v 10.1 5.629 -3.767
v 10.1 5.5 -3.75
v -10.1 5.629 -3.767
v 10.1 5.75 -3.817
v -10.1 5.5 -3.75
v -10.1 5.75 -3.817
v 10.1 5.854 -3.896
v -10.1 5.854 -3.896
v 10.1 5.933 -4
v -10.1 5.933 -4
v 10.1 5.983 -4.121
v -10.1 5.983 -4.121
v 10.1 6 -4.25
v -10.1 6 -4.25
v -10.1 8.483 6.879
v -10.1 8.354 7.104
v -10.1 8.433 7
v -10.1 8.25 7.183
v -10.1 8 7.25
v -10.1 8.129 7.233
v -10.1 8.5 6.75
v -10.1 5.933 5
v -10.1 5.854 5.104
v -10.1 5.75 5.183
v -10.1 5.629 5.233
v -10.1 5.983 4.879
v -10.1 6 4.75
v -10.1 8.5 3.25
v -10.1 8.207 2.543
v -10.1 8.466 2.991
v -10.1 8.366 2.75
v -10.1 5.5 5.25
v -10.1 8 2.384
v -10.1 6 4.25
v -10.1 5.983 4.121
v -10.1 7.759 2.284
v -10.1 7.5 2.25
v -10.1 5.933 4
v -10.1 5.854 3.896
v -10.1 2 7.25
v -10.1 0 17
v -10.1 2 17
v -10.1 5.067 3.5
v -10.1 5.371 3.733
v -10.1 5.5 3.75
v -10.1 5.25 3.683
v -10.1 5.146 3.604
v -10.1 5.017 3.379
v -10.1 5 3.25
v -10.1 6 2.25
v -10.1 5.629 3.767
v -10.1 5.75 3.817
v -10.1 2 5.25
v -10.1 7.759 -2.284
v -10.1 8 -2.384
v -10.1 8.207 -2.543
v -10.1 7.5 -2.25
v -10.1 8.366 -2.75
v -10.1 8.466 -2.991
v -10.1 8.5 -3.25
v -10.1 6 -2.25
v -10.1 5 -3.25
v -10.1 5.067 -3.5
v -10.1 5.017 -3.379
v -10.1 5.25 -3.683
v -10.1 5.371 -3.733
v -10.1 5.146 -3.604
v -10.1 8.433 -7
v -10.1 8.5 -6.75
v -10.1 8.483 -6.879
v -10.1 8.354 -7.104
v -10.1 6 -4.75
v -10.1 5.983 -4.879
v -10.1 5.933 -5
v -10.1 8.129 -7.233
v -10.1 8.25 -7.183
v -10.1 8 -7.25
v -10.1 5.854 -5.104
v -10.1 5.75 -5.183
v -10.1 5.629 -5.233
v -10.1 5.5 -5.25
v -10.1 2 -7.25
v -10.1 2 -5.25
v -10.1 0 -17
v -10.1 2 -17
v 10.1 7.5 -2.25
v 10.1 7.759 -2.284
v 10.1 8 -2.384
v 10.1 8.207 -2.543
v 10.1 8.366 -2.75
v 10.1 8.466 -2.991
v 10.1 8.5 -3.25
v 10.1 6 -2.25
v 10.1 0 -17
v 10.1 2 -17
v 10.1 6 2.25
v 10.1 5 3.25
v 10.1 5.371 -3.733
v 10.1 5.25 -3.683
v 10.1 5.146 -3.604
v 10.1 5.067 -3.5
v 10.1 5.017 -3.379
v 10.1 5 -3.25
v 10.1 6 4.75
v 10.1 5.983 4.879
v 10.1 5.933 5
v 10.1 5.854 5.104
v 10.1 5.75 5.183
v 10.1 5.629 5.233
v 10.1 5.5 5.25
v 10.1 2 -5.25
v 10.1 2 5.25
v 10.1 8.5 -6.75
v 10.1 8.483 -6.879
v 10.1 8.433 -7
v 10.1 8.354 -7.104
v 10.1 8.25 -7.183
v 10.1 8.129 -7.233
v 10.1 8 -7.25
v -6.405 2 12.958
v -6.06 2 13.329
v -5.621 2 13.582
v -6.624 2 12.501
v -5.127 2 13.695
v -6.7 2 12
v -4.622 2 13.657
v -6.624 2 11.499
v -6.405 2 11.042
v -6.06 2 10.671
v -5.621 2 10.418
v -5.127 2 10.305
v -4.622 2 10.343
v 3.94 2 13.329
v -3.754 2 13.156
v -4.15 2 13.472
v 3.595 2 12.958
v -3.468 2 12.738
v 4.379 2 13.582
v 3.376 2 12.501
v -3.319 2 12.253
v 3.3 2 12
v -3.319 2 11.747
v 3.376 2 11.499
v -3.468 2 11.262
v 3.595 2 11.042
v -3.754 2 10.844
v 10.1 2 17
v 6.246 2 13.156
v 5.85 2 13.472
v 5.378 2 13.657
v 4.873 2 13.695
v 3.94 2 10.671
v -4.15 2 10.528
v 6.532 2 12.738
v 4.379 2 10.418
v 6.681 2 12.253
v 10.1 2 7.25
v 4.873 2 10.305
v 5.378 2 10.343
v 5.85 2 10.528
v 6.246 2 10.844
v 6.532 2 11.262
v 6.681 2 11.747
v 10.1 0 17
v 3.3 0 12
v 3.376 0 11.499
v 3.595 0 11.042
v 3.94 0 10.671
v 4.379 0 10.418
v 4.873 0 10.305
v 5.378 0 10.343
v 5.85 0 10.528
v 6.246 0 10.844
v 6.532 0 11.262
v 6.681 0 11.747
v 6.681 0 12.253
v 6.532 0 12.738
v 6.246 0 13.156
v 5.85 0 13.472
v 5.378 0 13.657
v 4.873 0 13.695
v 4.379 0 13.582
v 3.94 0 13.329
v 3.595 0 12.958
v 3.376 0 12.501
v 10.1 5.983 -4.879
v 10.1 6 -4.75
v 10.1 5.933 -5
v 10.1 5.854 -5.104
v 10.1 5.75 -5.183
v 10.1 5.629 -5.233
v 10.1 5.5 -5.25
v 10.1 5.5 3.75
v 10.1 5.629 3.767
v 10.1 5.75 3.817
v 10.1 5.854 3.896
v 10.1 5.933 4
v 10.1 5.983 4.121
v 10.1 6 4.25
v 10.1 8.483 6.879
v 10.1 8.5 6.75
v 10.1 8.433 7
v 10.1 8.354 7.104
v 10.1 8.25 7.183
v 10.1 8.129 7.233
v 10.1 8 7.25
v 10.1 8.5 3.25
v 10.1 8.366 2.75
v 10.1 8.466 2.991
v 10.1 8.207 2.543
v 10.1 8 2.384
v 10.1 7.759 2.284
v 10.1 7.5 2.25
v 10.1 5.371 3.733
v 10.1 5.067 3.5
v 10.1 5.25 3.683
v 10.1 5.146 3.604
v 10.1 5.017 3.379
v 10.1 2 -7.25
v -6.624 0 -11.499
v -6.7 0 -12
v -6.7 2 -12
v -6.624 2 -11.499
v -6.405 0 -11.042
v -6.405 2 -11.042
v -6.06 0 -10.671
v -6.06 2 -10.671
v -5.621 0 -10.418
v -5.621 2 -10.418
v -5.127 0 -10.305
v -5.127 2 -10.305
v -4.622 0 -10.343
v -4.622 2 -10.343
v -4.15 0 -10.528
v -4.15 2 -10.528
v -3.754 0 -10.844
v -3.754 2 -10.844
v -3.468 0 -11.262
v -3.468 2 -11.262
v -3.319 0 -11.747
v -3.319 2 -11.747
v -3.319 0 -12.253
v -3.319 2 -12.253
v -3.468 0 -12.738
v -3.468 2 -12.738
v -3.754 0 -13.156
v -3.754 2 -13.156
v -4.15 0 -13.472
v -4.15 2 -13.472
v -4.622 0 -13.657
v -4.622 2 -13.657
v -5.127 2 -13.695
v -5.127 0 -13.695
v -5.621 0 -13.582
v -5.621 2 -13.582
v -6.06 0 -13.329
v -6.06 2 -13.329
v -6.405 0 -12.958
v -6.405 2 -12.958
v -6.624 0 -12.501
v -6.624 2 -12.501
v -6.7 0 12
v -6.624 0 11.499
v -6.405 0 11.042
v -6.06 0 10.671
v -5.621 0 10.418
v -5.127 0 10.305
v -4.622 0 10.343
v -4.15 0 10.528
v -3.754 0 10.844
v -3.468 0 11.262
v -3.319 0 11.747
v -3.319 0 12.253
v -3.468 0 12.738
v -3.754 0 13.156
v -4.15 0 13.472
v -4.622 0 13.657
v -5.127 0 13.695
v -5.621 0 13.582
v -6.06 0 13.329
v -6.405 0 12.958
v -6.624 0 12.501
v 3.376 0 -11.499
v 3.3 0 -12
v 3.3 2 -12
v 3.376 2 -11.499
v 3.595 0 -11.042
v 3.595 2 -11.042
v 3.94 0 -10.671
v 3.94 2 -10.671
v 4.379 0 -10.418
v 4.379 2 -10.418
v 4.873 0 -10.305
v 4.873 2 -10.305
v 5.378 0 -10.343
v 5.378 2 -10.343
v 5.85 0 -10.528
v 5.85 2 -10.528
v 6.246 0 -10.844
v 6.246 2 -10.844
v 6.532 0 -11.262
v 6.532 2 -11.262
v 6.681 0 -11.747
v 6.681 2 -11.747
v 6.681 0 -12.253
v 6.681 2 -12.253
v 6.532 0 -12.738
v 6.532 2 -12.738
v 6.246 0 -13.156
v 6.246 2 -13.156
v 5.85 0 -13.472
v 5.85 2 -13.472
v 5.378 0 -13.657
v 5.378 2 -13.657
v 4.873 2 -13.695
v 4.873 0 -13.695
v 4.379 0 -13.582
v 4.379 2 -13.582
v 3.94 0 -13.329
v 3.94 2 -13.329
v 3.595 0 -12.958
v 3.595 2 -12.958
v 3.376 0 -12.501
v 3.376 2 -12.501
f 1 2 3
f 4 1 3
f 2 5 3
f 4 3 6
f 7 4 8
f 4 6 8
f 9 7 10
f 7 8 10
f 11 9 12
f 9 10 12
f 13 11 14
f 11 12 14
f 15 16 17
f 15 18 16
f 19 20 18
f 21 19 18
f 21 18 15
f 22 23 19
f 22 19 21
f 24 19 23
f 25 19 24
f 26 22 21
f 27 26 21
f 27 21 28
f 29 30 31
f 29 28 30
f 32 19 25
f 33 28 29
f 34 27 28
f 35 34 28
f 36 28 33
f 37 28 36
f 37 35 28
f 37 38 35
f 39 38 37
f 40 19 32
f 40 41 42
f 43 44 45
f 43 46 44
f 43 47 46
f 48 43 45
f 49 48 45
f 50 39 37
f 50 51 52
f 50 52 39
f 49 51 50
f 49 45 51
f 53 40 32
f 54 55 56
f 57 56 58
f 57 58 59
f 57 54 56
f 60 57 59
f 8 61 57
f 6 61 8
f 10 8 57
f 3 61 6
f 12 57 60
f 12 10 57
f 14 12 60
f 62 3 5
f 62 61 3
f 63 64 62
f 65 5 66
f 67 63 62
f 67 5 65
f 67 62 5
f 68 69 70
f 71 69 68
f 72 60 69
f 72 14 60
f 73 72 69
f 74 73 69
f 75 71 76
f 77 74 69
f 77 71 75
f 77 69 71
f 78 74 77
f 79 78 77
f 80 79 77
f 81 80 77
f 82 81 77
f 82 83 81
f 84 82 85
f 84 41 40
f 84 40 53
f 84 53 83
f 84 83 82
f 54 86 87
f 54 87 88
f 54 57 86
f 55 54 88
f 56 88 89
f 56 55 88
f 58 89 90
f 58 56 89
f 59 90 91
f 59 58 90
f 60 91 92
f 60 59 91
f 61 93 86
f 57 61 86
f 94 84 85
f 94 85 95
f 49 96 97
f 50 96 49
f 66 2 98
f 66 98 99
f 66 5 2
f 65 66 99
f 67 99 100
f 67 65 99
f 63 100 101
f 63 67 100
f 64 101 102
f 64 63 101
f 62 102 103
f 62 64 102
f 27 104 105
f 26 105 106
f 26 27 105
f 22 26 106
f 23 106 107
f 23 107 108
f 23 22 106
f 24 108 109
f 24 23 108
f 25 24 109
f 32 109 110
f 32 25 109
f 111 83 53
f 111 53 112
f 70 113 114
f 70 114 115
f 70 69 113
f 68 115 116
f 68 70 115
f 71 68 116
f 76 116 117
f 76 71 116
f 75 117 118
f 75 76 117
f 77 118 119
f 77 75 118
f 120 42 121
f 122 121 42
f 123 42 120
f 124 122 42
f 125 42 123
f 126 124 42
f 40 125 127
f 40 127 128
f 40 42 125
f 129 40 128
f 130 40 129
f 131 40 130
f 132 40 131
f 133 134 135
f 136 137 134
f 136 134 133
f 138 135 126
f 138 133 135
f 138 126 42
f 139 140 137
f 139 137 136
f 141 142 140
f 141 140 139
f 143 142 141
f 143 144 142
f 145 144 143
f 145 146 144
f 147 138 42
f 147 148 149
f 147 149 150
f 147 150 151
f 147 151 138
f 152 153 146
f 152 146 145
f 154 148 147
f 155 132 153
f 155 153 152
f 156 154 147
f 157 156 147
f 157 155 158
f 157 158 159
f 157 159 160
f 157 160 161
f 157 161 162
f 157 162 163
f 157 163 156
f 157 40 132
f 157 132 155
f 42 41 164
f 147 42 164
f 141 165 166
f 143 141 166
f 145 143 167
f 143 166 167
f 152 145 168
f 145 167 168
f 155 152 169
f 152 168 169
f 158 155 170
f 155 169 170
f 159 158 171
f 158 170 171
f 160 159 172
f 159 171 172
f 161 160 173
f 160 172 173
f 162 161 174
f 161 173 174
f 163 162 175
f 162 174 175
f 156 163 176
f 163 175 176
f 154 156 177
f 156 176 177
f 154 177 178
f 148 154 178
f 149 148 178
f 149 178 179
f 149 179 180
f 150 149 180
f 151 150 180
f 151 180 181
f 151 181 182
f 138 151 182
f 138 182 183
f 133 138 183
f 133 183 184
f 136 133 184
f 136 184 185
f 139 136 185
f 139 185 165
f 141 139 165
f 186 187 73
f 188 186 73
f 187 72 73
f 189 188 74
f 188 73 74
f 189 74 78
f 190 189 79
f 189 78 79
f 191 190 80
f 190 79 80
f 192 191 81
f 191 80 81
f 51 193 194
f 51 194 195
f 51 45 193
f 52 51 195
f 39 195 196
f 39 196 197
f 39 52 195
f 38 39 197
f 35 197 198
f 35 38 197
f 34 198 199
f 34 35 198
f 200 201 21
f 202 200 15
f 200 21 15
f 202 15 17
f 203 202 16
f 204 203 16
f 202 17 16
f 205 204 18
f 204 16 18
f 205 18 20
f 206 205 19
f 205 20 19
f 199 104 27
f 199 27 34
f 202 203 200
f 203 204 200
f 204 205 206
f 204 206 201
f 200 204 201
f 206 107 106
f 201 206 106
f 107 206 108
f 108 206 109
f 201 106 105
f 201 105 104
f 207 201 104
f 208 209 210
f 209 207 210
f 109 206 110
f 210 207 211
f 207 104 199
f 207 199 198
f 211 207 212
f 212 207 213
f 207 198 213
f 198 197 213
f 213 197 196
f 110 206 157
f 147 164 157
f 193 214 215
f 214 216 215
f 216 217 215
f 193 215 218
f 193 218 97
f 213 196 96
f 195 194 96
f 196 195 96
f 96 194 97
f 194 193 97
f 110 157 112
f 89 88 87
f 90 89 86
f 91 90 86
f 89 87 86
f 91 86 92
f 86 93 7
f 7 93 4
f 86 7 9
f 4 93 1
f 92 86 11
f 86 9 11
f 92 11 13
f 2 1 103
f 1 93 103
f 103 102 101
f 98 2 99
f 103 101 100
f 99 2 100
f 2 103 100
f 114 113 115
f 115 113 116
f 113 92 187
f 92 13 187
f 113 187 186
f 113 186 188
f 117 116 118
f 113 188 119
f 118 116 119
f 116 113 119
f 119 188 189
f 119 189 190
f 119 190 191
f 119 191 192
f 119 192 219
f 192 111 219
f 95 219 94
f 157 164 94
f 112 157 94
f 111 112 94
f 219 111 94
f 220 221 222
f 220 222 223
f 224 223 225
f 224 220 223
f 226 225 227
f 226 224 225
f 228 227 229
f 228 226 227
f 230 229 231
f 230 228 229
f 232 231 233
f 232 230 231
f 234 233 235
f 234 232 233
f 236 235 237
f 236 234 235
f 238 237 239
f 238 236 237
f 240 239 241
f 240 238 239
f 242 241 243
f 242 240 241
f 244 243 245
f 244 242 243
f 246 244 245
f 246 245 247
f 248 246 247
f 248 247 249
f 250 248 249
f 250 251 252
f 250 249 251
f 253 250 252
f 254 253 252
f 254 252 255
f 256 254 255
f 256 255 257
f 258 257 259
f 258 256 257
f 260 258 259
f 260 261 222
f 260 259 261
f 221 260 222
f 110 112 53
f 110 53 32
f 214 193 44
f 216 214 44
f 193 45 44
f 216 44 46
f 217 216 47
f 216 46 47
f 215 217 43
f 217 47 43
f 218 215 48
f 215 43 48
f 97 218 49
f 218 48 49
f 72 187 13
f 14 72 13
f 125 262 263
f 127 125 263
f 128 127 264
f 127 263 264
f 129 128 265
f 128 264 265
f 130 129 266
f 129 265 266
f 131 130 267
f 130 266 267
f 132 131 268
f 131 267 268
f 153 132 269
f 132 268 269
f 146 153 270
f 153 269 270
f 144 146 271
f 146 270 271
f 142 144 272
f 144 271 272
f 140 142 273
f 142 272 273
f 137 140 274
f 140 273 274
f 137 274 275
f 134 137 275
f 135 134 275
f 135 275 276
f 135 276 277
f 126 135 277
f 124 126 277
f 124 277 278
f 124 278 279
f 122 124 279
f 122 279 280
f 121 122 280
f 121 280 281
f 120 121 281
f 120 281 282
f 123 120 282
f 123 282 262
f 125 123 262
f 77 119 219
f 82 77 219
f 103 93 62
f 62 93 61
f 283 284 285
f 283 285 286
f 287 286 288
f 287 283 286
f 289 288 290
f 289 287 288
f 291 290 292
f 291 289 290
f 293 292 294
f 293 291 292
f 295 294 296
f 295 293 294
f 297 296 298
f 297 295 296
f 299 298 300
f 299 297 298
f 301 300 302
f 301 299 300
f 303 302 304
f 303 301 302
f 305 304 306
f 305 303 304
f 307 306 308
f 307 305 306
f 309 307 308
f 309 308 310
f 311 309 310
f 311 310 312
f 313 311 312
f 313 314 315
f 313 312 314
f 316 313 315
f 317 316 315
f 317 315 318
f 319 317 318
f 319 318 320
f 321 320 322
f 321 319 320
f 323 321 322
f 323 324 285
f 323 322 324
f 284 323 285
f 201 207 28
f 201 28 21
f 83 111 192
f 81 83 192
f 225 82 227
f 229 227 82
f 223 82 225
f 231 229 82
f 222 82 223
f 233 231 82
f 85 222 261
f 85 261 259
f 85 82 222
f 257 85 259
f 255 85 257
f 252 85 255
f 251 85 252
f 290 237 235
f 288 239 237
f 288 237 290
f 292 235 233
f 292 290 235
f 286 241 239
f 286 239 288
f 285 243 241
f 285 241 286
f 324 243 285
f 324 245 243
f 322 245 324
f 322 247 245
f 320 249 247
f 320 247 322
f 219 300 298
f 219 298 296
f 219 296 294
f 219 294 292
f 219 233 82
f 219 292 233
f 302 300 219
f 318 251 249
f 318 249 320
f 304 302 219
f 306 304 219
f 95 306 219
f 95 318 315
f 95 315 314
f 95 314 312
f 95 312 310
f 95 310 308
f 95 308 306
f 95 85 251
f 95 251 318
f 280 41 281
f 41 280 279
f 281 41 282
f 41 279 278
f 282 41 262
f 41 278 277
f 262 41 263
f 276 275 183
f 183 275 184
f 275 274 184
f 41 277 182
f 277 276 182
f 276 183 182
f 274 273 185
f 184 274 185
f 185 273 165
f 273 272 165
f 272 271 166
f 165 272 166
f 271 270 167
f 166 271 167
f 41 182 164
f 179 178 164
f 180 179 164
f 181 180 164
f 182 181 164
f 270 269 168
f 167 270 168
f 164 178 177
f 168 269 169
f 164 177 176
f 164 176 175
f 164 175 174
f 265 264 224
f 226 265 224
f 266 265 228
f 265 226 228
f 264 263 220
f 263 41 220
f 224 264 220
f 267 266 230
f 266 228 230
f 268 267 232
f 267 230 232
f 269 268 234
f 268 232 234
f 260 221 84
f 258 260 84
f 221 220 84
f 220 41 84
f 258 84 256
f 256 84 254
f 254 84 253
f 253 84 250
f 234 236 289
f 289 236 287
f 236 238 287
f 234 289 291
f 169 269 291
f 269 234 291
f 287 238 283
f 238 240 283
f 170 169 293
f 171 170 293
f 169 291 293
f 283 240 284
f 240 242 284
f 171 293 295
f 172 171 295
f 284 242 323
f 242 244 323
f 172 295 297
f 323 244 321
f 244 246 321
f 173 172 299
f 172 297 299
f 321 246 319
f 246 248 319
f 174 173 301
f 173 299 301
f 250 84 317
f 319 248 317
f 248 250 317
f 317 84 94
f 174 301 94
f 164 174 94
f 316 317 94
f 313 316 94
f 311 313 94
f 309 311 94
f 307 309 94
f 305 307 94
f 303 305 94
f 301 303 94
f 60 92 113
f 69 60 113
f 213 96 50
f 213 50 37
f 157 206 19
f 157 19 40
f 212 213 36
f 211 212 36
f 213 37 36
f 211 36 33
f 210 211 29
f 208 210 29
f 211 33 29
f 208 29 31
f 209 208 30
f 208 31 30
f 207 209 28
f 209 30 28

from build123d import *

# Parameters (mm, degrees)
SCHIZZO1_W                   = 20.2
SCHIZZO1_H                   = 34
ESTRUSIONE_ESTRUSIONE1_DEPTH = 2
ESTRUSIONE_ESTRUSIONE2_DEPTH = 20.2
SMUSSO1_SIZE                 = 1
RACCORDO2_R                  = 0.5
RACCORDO3_R                  = 1
FORO_PER_VITE_M3_1_D         = 3.4
SMUSSO1_OF_SPECCHIA2_SIZE    = 1
RACCORDO2_OF_SPECCHIA2_R     = 0.5
RACCORDO3_OF_SPECCHIA2_R     = 1


with BuildPart() as part:
    # Schizzo1 → Estrusione-Estrusione1 (new body)
    with BuildSketch(Plane(origin=(0, 0, 0), x_dir=(1, 0, 0), z_dir=(0, 1, 0))):
        Rectangle(SCHIZZO1_W, SCHIZZO1_H)
    extrude(amount=ESTRUSIONE_ESTRUSIONE1_DEPTH)

    # Schizzo3 → Estrusione-Estrusione2 (add)
    with BuildSketch(Plane(origin=(10.1, 0, 0), x_dir=(0, 0, -1), z_dir=(1, 0, 0))):
        Polygon((-7.25, 2), (-5.25, 2), (-5.25, 6), (-3.75, 6), (-3.75, 5), (-2.25, 5), (-2.25, 8.5), (-7.25, 8.5), align=None)
    estrusione_estrusione2 = extrude(amount=-ESTRUSIONE_ESTRUSIONE2_DEPTH)

    # Smusso1
    smusso1_edges = [part.edges().sort_by_distance(p)[0] for p in [
        (0, 5, 2.25),
    ]]
    chamfer(smusso1_edges, length=SMUSSO1_SIZE)

    # Raccordo2
    raccordo2_edges = [part.edges().sort_by_distance(p)[0] for p in [
        (0, 6, 5.25),
        (0, 6, 3.75),
    ]]
    fillet(raccordo2_edges, radius=RACCORDO2_R)
    raccordo2_2_edges = [part.edges().sort_by_distance(p)[0] for p in [
        (0, 8.5, 7.25),
        (0, 5, 3.75),
    ]]
    fillet(raccordo2_2_edges, radius=RACCORDO2_R - 0.0001)  # a hair under: the kernel refuses the full size

    # Raccordo3
    raccordo3_edges = [part.edges().sort_by_distance(p)[0] for p in [
        (0, 8.5, 2.25),
    ]]
    fillet(raccordo3_edges, radius=RACCORDO3_R)

    # Foro per Vite M3-1 (through all)
    with Locations(Plane(origin=(0, 2, 0), x_dir=(1, 0, 0), z_dir=(0, 1, 0))):
        with Locations((-5, -12), (5, -12)):
            foro_per_vite_m3_1 = Hole(FORO_PER_VITE_M3_1_D / 2)

    # Specchia2: Estrusione-Estrusione2, Foro per Vite M3-1 across plane
    add(estrusione_estrusione2.mirror(Plane.XY))
    add(foro_per_vite_m3_1.mirror(Plane.XY), mode=Mode.SUBTRACT)

    # Smusso1 of Specchia2
    smusso1_of_specchia2_edges = [part.edges().sort_by_distance(p)[0] for p in [
        (0, 5, -2.25),
    ]]
    chamfer(smusso1_of_specchia2_edges, length=SMUSSO1_OF_SPECCHIA2_SIZE)

    # Raccordo2 of Specchia2
    raccordo2_of_specchia2_edges = [part.edges().sort_by_distance(p)[0] for p in [
        (0, 6, -5.25),
        (0, 6, -3.75),
    ]]
    fillet(raccordo2_of_specchia2_edges, radius=RACCORDO2_OF_SPECCHIA2_R)
    raccordo2_of_specchia2_2_edges = [part.edges().sort_by_distance(p)[0] for p in [
        (0, 8.5, -7.25),
        (0, 5, -3.75),
    ]]
    fillet(raccordo2_of_specchia2_2_edges, radius=RACCORDO2_OF_SPECCHIA2_R - 0.0001)  # a hair under: the kernel refuses the full size

    # Raccordo3 of Specchia2
    raccordo3_of_specchia2_edges = [part.edges().sort_by_distance(p)[0] for p in [
        (0, 8.5, -2.25),
    ]]
    fillet(raccordo3_of_specchia2_edges, radius=RACCORDO3_OF_SPECCHIA2_R)


solid = part.part
